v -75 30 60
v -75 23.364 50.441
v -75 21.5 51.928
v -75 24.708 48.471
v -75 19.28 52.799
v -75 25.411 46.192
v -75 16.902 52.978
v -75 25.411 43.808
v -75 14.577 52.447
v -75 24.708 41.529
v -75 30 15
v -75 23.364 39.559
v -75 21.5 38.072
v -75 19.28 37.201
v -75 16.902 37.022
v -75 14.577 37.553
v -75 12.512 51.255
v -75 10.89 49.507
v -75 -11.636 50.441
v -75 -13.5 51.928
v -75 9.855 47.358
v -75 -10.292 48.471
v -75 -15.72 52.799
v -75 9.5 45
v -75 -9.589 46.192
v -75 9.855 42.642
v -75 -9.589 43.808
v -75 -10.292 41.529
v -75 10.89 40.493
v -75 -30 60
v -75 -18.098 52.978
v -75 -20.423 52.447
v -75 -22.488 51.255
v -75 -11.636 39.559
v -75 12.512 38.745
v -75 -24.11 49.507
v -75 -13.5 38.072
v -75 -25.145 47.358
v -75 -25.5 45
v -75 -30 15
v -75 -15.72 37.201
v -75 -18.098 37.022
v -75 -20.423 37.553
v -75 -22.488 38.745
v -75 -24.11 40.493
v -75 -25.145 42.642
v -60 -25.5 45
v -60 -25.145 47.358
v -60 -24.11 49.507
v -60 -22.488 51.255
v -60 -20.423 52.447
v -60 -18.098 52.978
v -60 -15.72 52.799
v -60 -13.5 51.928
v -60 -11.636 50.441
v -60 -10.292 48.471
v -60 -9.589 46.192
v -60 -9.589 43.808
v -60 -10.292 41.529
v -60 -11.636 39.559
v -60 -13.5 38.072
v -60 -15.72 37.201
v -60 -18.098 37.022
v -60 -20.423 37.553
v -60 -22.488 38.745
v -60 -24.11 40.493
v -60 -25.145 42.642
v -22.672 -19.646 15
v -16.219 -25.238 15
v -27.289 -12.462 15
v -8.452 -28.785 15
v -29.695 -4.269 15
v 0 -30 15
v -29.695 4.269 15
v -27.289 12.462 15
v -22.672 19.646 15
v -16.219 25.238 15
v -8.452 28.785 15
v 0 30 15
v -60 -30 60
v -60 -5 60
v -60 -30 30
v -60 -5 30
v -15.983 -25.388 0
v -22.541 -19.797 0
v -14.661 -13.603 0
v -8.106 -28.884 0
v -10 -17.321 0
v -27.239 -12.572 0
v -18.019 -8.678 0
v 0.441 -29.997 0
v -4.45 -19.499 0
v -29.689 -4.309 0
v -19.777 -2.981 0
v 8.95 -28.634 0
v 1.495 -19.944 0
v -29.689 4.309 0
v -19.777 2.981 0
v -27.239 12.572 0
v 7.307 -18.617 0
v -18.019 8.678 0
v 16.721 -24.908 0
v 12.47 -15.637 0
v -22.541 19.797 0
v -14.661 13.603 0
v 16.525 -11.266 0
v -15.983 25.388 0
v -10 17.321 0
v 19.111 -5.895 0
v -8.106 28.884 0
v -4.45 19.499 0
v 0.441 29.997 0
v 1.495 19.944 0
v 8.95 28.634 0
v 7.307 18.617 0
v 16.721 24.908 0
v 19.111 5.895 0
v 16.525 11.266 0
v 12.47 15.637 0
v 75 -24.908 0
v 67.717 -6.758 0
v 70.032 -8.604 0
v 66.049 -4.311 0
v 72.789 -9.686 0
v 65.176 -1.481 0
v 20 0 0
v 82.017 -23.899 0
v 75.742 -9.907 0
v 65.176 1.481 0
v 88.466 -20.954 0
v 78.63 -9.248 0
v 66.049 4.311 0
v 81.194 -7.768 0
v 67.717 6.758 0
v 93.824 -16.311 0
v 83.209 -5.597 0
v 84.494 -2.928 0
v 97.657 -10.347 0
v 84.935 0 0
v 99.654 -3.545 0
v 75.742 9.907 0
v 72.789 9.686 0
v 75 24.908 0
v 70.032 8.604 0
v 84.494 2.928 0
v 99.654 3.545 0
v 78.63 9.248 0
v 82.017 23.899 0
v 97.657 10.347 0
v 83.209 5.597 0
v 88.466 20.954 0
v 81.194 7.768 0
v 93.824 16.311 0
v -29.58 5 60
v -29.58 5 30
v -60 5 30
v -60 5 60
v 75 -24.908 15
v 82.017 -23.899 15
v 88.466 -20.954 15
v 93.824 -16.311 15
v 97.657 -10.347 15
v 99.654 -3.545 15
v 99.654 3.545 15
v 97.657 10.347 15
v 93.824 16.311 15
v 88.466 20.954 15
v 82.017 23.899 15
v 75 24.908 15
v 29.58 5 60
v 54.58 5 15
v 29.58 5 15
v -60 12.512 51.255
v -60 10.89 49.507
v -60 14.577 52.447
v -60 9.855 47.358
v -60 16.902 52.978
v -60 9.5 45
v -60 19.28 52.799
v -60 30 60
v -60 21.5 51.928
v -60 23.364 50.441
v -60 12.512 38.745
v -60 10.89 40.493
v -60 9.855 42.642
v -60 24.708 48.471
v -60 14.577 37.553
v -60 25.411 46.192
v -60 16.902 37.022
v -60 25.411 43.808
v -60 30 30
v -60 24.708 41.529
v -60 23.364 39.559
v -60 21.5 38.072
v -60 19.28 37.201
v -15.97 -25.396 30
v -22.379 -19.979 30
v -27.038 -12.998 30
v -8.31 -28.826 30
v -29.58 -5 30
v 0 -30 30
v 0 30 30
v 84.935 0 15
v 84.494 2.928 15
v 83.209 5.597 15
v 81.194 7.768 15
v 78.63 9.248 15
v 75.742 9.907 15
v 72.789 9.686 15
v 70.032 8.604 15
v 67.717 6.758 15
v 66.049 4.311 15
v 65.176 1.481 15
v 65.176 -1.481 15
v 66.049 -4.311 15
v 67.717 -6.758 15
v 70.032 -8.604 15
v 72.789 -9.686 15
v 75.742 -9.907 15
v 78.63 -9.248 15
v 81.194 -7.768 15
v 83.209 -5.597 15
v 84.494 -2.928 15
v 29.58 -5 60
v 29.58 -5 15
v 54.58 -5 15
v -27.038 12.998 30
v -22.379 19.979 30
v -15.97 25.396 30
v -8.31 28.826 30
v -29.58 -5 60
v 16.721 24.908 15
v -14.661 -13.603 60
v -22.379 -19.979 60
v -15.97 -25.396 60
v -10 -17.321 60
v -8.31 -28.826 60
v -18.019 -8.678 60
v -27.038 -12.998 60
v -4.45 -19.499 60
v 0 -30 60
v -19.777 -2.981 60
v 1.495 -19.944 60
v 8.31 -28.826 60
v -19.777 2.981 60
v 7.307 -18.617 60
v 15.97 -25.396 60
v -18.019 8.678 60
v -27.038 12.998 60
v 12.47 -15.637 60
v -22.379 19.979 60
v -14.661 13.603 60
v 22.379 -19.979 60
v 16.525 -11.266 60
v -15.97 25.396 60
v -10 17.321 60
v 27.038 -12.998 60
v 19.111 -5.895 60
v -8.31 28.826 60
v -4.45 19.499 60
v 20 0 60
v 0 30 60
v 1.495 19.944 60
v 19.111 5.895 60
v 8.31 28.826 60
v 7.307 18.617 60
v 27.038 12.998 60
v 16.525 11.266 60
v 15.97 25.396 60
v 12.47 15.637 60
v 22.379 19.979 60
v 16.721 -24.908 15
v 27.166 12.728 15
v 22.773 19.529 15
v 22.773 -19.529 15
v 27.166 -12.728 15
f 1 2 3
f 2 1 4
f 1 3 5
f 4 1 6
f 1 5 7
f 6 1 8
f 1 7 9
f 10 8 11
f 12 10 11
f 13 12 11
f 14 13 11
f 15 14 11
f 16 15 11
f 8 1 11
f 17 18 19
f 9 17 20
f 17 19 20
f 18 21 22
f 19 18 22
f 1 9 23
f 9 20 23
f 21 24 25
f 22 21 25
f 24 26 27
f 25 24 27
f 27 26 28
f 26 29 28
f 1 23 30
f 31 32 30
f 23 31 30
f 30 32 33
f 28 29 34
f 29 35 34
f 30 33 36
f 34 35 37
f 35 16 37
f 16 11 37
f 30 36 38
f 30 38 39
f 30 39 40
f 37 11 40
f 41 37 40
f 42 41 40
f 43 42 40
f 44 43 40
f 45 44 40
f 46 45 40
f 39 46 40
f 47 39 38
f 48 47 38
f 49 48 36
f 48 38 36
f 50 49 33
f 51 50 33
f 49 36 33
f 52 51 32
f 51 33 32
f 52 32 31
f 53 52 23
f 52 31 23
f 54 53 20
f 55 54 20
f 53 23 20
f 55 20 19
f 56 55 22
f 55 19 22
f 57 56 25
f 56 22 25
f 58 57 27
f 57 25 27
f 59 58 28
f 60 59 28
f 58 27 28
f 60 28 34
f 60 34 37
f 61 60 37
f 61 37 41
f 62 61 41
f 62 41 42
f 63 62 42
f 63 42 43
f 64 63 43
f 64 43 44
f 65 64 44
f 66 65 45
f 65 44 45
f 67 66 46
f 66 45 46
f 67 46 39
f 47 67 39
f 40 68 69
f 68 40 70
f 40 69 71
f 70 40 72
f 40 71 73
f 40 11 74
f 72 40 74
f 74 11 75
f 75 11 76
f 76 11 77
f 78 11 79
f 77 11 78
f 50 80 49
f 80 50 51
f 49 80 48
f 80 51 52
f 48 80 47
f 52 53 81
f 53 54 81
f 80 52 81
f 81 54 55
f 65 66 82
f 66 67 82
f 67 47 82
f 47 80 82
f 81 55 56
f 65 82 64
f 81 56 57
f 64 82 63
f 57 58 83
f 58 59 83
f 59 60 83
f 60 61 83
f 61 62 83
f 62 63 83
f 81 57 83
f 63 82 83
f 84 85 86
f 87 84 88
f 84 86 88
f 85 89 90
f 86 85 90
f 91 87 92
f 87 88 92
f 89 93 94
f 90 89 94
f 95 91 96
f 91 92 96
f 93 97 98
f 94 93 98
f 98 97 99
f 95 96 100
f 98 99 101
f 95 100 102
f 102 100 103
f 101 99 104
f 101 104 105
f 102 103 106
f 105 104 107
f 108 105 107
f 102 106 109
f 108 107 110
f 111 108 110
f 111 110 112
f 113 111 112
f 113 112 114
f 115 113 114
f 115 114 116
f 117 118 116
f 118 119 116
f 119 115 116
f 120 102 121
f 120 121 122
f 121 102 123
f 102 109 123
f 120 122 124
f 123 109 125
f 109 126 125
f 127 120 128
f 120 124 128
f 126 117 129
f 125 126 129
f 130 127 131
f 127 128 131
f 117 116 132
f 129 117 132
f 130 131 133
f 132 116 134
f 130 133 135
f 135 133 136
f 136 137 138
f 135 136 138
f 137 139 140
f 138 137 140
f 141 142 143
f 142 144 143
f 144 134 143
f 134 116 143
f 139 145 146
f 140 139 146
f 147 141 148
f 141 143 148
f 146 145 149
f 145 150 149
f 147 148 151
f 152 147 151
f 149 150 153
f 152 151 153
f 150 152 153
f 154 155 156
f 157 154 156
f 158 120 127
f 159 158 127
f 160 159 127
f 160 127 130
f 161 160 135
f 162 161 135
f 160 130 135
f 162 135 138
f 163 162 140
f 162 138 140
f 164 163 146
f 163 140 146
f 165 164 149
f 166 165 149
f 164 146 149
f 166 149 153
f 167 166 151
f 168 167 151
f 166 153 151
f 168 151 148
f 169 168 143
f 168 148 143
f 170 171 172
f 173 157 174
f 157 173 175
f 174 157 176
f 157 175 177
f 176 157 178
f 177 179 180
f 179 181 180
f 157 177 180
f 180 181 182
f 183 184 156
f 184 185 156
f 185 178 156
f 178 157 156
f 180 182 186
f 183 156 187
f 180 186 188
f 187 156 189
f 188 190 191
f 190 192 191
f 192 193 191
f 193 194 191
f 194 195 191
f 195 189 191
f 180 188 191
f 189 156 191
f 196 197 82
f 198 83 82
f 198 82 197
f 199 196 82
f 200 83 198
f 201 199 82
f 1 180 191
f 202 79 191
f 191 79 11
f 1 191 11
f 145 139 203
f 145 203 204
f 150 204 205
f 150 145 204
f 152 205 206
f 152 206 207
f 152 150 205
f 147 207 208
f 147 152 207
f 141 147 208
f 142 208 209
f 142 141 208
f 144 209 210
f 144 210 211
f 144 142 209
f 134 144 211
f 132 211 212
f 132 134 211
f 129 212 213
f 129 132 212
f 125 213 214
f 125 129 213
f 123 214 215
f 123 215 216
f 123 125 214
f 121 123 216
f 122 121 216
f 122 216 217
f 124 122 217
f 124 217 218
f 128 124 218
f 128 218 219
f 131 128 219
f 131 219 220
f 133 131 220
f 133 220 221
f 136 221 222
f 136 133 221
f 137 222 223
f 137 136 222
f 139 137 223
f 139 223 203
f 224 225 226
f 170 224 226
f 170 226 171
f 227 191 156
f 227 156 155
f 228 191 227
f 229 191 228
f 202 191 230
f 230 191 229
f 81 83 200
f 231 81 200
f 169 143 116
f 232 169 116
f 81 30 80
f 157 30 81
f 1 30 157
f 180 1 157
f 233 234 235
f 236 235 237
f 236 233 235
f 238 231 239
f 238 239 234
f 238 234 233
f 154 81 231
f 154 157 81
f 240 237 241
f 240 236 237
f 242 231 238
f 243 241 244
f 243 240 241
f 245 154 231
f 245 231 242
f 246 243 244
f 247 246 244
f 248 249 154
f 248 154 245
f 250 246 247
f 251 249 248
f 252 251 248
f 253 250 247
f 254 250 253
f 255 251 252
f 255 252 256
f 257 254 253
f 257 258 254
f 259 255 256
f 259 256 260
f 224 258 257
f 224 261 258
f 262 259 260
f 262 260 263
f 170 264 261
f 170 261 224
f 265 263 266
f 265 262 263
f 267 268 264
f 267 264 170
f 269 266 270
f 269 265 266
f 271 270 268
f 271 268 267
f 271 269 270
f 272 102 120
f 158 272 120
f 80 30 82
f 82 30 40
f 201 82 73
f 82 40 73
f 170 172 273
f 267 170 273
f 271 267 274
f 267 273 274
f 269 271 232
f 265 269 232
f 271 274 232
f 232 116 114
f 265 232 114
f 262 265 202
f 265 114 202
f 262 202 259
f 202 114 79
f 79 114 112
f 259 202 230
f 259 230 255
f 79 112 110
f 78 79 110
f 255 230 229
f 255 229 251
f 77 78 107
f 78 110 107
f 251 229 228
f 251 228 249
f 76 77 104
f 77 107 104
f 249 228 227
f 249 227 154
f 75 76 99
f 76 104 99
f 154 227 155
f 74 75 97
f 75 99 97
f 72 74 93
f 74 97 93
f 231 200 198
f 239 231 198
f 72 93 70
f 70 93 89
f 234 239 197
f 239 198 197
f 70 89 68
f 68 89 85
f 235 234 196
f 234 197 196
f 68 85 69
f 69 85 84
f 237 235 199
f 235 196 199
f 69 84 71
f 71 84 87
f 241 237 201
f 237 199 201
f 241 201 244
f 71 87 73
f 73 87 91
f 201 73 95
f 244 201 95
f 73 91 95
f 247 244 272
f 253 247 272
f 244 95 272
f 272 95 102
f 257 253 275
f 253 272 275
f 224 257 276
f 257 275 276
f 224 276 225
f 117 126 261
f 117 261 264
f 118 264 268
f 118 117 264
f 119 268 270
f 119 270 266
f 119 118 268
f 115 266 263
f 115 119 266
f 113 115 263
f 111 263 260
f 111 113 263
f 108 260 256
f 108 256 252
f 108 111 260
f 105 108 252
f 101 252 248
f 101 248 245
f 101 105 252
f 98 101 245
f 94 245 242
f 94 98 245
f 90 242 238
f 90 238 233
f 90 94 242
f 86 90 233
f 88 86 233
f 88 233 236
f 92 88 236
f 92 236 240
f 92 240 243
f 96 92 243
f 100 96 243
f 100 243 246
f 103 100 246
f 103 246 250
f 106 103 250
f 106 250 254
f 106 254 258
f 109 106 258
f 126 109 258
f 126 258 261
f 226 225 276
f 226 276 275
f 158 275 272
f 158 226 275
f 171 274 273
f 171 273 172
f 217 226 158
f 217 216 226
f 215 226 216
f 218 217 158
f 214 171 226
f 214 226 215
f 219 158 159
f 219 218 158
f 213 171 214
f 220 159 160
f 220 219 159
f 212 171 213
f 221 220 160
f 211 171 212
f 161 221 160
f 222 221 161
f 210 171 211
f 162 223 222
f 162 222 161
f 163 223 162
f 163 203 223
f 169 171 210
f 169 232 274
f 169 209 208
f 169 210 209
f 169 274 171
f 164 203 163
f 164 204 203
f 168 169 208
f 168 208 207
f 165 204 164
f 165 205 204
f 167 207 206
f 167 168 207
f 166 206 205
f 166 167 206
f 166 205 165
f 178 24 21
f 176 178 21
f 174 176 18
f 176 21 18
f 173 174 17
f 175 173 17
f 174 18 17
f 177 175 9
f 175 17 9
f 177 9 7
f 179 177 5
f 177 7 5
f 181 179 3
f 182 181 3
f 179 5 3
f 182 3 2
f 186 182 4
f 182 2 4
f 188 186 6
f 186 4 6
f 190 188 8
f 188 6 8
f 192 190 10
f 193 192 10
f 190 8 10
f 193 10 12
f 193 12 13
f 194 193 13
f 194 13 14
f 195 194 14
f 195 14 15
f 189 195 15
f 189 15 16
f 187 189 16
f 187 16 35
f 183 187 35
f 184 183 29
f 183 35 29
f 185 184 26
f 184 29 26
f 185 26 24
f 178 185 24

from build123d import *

# Parameters (mm, degrees)
F0_R      = 30
F0_R_2    = 20
F1_DEPTH  = 60
F2_R      = 20
F2_R_2    = 9.9351128524
F3_DEPTH  = 15
F5_DEPTH  = 45
F6_SIZE2  = 24.99999
F6_SIZE   = 44.99999
F7_R      = 20
F8_DEPTH  = 15
F10_DEPTH = 30
F11_R     = 8
F12_DEPTH = 15


# Not quite as in the source:
# - a fillet or chamfer is up to 0.001 mm smaller than in the source, because OpenCascade refuses the exact size


with BuildPart() as f1:
    # F0 (on Top) → F1 (new body)
    with BuildSketch(Plane.XY):
        Circle(F0_R)
        Circle(F0_R_2, mode=Mode.SUBTRACT)
    extrude(amount=F1_DEPTH)

    # F2 (on Top) → F3 (join)
    with BuildSketch(Plane.XY):
        with BuildLine():
            Line((16.7213538347, -24.9077563409), (75, -24.9077563409))
            ThreePointArc((75, -24.9077563409), (99.9077563409, 0), (75, 24.9077563409))
            Line((75, 24.9077563409), (16.7213538347, 24.9077563409))
            ThreePointArc((16.7213538347, 24.9077563409), (-30, 0), (16.7213538347, -24.9077563409))
        make_face()
        Circle(F2_R, mode=Mode.SUBTRACT)
        with Locations((75, 0)):
            Circle(F2_R_2, mode=Mode.SUBTRACT)
    extrude(amount=F3_DEPTH)

    # F4 (on face) → F5 (join, through all)
    with BuildSketch(Plane.XY.offset(15)):
        with BuildLine():
            Line((54.5803989155, 5), (29.5803989155, 5))
            ThreePointArc((29.5803989155, 5), (30, 0), (29.5803989155, -5))
            Line((29.5803989155, -5), (54.5803989155, -5))
            Line((54.5803989155, -5), (54.5803989155, 5))
        make_face()
    extrude(amount=F5_DEPTH)

    # F6 (size 45 and 25 in the source; OpenCascade refuses exactly that, so slightly less here)
    f6_edges = [f1.edges().sort_by_distance(p)[0] for p in [
        (54.580399, 0, 60),
    ]]
    f6_side = f1.faces().sort_by_distance((54.580399, 0, 37.5))[0]
    chamfer(f6_edges, length=F6_SIZE, length2=F6_SIZE2, reference=f6_side)

    # F7 (on face) → F8 (join)
    with BuildSketch(Plane.XY.offset(15)):
        with BuildLine():
            Line((29.5803989155, -5), (29.5803989155, 5))
            ThreePointArc((29.5803989155, 5), (19.364916731, 22.9128784748), (0, 30))
            ThreePointArc((0, 30), (-30, 0), (0, -30))
            ThreePointArc((0, -30), (19.364916731, -22.9128784748), (29.5803989155, -5))
        make_face()
        Circle(F7_R, mode=Mode.SUBTRACT)
        with BuildLine():
            ThreePointArc((0, -30), (-30, 0), (0, 30))
            Line((0, 30), (-75, 30))
            Line((-75, 30), (-75, -30))
            Line((-75, -30), (0, -30))
        make_face()
    extrude(amount=F8_DEPTH)

    # F9 (on face) → F10 (join, through all)
    with BuildSketch(Plane.XY.offset(30)):
        with BuildLine():
            Line((-60, 30), (-75, 30))
            Line((-75, 30), (-75, -30))
            Line((-75, -30), (-60, -30))
            Line((-60, -30), (-60, -5))
            Line((-60, -5), (-29.5803989155, -5))
            ThreePointArc((-29.5803989155, -5), (-30, 0), (-29.5803989155, 5))
            Line((-29.5803989155, 5), (-60, 5))
            Line((-60, 5), (-60, 30))
        make_face()
    extrude(amount=F10_DEPTH)

    # F11 (on face) → F12 (cut, through all)
    with BuildSketch(Plane(origin=(-75, 0, 0), x_dir=(0, -1, 0), z_dir=(-1, 0, 0))):
        with Locations((17.5, 45)):
            Circle(F11_R)
        with Locations((-17.5, 45)):
            Circle(F11_R)
    extrude(amount=-F12_DEPTH, mode=Mode.SUBTRACT)


solid = f1.part
